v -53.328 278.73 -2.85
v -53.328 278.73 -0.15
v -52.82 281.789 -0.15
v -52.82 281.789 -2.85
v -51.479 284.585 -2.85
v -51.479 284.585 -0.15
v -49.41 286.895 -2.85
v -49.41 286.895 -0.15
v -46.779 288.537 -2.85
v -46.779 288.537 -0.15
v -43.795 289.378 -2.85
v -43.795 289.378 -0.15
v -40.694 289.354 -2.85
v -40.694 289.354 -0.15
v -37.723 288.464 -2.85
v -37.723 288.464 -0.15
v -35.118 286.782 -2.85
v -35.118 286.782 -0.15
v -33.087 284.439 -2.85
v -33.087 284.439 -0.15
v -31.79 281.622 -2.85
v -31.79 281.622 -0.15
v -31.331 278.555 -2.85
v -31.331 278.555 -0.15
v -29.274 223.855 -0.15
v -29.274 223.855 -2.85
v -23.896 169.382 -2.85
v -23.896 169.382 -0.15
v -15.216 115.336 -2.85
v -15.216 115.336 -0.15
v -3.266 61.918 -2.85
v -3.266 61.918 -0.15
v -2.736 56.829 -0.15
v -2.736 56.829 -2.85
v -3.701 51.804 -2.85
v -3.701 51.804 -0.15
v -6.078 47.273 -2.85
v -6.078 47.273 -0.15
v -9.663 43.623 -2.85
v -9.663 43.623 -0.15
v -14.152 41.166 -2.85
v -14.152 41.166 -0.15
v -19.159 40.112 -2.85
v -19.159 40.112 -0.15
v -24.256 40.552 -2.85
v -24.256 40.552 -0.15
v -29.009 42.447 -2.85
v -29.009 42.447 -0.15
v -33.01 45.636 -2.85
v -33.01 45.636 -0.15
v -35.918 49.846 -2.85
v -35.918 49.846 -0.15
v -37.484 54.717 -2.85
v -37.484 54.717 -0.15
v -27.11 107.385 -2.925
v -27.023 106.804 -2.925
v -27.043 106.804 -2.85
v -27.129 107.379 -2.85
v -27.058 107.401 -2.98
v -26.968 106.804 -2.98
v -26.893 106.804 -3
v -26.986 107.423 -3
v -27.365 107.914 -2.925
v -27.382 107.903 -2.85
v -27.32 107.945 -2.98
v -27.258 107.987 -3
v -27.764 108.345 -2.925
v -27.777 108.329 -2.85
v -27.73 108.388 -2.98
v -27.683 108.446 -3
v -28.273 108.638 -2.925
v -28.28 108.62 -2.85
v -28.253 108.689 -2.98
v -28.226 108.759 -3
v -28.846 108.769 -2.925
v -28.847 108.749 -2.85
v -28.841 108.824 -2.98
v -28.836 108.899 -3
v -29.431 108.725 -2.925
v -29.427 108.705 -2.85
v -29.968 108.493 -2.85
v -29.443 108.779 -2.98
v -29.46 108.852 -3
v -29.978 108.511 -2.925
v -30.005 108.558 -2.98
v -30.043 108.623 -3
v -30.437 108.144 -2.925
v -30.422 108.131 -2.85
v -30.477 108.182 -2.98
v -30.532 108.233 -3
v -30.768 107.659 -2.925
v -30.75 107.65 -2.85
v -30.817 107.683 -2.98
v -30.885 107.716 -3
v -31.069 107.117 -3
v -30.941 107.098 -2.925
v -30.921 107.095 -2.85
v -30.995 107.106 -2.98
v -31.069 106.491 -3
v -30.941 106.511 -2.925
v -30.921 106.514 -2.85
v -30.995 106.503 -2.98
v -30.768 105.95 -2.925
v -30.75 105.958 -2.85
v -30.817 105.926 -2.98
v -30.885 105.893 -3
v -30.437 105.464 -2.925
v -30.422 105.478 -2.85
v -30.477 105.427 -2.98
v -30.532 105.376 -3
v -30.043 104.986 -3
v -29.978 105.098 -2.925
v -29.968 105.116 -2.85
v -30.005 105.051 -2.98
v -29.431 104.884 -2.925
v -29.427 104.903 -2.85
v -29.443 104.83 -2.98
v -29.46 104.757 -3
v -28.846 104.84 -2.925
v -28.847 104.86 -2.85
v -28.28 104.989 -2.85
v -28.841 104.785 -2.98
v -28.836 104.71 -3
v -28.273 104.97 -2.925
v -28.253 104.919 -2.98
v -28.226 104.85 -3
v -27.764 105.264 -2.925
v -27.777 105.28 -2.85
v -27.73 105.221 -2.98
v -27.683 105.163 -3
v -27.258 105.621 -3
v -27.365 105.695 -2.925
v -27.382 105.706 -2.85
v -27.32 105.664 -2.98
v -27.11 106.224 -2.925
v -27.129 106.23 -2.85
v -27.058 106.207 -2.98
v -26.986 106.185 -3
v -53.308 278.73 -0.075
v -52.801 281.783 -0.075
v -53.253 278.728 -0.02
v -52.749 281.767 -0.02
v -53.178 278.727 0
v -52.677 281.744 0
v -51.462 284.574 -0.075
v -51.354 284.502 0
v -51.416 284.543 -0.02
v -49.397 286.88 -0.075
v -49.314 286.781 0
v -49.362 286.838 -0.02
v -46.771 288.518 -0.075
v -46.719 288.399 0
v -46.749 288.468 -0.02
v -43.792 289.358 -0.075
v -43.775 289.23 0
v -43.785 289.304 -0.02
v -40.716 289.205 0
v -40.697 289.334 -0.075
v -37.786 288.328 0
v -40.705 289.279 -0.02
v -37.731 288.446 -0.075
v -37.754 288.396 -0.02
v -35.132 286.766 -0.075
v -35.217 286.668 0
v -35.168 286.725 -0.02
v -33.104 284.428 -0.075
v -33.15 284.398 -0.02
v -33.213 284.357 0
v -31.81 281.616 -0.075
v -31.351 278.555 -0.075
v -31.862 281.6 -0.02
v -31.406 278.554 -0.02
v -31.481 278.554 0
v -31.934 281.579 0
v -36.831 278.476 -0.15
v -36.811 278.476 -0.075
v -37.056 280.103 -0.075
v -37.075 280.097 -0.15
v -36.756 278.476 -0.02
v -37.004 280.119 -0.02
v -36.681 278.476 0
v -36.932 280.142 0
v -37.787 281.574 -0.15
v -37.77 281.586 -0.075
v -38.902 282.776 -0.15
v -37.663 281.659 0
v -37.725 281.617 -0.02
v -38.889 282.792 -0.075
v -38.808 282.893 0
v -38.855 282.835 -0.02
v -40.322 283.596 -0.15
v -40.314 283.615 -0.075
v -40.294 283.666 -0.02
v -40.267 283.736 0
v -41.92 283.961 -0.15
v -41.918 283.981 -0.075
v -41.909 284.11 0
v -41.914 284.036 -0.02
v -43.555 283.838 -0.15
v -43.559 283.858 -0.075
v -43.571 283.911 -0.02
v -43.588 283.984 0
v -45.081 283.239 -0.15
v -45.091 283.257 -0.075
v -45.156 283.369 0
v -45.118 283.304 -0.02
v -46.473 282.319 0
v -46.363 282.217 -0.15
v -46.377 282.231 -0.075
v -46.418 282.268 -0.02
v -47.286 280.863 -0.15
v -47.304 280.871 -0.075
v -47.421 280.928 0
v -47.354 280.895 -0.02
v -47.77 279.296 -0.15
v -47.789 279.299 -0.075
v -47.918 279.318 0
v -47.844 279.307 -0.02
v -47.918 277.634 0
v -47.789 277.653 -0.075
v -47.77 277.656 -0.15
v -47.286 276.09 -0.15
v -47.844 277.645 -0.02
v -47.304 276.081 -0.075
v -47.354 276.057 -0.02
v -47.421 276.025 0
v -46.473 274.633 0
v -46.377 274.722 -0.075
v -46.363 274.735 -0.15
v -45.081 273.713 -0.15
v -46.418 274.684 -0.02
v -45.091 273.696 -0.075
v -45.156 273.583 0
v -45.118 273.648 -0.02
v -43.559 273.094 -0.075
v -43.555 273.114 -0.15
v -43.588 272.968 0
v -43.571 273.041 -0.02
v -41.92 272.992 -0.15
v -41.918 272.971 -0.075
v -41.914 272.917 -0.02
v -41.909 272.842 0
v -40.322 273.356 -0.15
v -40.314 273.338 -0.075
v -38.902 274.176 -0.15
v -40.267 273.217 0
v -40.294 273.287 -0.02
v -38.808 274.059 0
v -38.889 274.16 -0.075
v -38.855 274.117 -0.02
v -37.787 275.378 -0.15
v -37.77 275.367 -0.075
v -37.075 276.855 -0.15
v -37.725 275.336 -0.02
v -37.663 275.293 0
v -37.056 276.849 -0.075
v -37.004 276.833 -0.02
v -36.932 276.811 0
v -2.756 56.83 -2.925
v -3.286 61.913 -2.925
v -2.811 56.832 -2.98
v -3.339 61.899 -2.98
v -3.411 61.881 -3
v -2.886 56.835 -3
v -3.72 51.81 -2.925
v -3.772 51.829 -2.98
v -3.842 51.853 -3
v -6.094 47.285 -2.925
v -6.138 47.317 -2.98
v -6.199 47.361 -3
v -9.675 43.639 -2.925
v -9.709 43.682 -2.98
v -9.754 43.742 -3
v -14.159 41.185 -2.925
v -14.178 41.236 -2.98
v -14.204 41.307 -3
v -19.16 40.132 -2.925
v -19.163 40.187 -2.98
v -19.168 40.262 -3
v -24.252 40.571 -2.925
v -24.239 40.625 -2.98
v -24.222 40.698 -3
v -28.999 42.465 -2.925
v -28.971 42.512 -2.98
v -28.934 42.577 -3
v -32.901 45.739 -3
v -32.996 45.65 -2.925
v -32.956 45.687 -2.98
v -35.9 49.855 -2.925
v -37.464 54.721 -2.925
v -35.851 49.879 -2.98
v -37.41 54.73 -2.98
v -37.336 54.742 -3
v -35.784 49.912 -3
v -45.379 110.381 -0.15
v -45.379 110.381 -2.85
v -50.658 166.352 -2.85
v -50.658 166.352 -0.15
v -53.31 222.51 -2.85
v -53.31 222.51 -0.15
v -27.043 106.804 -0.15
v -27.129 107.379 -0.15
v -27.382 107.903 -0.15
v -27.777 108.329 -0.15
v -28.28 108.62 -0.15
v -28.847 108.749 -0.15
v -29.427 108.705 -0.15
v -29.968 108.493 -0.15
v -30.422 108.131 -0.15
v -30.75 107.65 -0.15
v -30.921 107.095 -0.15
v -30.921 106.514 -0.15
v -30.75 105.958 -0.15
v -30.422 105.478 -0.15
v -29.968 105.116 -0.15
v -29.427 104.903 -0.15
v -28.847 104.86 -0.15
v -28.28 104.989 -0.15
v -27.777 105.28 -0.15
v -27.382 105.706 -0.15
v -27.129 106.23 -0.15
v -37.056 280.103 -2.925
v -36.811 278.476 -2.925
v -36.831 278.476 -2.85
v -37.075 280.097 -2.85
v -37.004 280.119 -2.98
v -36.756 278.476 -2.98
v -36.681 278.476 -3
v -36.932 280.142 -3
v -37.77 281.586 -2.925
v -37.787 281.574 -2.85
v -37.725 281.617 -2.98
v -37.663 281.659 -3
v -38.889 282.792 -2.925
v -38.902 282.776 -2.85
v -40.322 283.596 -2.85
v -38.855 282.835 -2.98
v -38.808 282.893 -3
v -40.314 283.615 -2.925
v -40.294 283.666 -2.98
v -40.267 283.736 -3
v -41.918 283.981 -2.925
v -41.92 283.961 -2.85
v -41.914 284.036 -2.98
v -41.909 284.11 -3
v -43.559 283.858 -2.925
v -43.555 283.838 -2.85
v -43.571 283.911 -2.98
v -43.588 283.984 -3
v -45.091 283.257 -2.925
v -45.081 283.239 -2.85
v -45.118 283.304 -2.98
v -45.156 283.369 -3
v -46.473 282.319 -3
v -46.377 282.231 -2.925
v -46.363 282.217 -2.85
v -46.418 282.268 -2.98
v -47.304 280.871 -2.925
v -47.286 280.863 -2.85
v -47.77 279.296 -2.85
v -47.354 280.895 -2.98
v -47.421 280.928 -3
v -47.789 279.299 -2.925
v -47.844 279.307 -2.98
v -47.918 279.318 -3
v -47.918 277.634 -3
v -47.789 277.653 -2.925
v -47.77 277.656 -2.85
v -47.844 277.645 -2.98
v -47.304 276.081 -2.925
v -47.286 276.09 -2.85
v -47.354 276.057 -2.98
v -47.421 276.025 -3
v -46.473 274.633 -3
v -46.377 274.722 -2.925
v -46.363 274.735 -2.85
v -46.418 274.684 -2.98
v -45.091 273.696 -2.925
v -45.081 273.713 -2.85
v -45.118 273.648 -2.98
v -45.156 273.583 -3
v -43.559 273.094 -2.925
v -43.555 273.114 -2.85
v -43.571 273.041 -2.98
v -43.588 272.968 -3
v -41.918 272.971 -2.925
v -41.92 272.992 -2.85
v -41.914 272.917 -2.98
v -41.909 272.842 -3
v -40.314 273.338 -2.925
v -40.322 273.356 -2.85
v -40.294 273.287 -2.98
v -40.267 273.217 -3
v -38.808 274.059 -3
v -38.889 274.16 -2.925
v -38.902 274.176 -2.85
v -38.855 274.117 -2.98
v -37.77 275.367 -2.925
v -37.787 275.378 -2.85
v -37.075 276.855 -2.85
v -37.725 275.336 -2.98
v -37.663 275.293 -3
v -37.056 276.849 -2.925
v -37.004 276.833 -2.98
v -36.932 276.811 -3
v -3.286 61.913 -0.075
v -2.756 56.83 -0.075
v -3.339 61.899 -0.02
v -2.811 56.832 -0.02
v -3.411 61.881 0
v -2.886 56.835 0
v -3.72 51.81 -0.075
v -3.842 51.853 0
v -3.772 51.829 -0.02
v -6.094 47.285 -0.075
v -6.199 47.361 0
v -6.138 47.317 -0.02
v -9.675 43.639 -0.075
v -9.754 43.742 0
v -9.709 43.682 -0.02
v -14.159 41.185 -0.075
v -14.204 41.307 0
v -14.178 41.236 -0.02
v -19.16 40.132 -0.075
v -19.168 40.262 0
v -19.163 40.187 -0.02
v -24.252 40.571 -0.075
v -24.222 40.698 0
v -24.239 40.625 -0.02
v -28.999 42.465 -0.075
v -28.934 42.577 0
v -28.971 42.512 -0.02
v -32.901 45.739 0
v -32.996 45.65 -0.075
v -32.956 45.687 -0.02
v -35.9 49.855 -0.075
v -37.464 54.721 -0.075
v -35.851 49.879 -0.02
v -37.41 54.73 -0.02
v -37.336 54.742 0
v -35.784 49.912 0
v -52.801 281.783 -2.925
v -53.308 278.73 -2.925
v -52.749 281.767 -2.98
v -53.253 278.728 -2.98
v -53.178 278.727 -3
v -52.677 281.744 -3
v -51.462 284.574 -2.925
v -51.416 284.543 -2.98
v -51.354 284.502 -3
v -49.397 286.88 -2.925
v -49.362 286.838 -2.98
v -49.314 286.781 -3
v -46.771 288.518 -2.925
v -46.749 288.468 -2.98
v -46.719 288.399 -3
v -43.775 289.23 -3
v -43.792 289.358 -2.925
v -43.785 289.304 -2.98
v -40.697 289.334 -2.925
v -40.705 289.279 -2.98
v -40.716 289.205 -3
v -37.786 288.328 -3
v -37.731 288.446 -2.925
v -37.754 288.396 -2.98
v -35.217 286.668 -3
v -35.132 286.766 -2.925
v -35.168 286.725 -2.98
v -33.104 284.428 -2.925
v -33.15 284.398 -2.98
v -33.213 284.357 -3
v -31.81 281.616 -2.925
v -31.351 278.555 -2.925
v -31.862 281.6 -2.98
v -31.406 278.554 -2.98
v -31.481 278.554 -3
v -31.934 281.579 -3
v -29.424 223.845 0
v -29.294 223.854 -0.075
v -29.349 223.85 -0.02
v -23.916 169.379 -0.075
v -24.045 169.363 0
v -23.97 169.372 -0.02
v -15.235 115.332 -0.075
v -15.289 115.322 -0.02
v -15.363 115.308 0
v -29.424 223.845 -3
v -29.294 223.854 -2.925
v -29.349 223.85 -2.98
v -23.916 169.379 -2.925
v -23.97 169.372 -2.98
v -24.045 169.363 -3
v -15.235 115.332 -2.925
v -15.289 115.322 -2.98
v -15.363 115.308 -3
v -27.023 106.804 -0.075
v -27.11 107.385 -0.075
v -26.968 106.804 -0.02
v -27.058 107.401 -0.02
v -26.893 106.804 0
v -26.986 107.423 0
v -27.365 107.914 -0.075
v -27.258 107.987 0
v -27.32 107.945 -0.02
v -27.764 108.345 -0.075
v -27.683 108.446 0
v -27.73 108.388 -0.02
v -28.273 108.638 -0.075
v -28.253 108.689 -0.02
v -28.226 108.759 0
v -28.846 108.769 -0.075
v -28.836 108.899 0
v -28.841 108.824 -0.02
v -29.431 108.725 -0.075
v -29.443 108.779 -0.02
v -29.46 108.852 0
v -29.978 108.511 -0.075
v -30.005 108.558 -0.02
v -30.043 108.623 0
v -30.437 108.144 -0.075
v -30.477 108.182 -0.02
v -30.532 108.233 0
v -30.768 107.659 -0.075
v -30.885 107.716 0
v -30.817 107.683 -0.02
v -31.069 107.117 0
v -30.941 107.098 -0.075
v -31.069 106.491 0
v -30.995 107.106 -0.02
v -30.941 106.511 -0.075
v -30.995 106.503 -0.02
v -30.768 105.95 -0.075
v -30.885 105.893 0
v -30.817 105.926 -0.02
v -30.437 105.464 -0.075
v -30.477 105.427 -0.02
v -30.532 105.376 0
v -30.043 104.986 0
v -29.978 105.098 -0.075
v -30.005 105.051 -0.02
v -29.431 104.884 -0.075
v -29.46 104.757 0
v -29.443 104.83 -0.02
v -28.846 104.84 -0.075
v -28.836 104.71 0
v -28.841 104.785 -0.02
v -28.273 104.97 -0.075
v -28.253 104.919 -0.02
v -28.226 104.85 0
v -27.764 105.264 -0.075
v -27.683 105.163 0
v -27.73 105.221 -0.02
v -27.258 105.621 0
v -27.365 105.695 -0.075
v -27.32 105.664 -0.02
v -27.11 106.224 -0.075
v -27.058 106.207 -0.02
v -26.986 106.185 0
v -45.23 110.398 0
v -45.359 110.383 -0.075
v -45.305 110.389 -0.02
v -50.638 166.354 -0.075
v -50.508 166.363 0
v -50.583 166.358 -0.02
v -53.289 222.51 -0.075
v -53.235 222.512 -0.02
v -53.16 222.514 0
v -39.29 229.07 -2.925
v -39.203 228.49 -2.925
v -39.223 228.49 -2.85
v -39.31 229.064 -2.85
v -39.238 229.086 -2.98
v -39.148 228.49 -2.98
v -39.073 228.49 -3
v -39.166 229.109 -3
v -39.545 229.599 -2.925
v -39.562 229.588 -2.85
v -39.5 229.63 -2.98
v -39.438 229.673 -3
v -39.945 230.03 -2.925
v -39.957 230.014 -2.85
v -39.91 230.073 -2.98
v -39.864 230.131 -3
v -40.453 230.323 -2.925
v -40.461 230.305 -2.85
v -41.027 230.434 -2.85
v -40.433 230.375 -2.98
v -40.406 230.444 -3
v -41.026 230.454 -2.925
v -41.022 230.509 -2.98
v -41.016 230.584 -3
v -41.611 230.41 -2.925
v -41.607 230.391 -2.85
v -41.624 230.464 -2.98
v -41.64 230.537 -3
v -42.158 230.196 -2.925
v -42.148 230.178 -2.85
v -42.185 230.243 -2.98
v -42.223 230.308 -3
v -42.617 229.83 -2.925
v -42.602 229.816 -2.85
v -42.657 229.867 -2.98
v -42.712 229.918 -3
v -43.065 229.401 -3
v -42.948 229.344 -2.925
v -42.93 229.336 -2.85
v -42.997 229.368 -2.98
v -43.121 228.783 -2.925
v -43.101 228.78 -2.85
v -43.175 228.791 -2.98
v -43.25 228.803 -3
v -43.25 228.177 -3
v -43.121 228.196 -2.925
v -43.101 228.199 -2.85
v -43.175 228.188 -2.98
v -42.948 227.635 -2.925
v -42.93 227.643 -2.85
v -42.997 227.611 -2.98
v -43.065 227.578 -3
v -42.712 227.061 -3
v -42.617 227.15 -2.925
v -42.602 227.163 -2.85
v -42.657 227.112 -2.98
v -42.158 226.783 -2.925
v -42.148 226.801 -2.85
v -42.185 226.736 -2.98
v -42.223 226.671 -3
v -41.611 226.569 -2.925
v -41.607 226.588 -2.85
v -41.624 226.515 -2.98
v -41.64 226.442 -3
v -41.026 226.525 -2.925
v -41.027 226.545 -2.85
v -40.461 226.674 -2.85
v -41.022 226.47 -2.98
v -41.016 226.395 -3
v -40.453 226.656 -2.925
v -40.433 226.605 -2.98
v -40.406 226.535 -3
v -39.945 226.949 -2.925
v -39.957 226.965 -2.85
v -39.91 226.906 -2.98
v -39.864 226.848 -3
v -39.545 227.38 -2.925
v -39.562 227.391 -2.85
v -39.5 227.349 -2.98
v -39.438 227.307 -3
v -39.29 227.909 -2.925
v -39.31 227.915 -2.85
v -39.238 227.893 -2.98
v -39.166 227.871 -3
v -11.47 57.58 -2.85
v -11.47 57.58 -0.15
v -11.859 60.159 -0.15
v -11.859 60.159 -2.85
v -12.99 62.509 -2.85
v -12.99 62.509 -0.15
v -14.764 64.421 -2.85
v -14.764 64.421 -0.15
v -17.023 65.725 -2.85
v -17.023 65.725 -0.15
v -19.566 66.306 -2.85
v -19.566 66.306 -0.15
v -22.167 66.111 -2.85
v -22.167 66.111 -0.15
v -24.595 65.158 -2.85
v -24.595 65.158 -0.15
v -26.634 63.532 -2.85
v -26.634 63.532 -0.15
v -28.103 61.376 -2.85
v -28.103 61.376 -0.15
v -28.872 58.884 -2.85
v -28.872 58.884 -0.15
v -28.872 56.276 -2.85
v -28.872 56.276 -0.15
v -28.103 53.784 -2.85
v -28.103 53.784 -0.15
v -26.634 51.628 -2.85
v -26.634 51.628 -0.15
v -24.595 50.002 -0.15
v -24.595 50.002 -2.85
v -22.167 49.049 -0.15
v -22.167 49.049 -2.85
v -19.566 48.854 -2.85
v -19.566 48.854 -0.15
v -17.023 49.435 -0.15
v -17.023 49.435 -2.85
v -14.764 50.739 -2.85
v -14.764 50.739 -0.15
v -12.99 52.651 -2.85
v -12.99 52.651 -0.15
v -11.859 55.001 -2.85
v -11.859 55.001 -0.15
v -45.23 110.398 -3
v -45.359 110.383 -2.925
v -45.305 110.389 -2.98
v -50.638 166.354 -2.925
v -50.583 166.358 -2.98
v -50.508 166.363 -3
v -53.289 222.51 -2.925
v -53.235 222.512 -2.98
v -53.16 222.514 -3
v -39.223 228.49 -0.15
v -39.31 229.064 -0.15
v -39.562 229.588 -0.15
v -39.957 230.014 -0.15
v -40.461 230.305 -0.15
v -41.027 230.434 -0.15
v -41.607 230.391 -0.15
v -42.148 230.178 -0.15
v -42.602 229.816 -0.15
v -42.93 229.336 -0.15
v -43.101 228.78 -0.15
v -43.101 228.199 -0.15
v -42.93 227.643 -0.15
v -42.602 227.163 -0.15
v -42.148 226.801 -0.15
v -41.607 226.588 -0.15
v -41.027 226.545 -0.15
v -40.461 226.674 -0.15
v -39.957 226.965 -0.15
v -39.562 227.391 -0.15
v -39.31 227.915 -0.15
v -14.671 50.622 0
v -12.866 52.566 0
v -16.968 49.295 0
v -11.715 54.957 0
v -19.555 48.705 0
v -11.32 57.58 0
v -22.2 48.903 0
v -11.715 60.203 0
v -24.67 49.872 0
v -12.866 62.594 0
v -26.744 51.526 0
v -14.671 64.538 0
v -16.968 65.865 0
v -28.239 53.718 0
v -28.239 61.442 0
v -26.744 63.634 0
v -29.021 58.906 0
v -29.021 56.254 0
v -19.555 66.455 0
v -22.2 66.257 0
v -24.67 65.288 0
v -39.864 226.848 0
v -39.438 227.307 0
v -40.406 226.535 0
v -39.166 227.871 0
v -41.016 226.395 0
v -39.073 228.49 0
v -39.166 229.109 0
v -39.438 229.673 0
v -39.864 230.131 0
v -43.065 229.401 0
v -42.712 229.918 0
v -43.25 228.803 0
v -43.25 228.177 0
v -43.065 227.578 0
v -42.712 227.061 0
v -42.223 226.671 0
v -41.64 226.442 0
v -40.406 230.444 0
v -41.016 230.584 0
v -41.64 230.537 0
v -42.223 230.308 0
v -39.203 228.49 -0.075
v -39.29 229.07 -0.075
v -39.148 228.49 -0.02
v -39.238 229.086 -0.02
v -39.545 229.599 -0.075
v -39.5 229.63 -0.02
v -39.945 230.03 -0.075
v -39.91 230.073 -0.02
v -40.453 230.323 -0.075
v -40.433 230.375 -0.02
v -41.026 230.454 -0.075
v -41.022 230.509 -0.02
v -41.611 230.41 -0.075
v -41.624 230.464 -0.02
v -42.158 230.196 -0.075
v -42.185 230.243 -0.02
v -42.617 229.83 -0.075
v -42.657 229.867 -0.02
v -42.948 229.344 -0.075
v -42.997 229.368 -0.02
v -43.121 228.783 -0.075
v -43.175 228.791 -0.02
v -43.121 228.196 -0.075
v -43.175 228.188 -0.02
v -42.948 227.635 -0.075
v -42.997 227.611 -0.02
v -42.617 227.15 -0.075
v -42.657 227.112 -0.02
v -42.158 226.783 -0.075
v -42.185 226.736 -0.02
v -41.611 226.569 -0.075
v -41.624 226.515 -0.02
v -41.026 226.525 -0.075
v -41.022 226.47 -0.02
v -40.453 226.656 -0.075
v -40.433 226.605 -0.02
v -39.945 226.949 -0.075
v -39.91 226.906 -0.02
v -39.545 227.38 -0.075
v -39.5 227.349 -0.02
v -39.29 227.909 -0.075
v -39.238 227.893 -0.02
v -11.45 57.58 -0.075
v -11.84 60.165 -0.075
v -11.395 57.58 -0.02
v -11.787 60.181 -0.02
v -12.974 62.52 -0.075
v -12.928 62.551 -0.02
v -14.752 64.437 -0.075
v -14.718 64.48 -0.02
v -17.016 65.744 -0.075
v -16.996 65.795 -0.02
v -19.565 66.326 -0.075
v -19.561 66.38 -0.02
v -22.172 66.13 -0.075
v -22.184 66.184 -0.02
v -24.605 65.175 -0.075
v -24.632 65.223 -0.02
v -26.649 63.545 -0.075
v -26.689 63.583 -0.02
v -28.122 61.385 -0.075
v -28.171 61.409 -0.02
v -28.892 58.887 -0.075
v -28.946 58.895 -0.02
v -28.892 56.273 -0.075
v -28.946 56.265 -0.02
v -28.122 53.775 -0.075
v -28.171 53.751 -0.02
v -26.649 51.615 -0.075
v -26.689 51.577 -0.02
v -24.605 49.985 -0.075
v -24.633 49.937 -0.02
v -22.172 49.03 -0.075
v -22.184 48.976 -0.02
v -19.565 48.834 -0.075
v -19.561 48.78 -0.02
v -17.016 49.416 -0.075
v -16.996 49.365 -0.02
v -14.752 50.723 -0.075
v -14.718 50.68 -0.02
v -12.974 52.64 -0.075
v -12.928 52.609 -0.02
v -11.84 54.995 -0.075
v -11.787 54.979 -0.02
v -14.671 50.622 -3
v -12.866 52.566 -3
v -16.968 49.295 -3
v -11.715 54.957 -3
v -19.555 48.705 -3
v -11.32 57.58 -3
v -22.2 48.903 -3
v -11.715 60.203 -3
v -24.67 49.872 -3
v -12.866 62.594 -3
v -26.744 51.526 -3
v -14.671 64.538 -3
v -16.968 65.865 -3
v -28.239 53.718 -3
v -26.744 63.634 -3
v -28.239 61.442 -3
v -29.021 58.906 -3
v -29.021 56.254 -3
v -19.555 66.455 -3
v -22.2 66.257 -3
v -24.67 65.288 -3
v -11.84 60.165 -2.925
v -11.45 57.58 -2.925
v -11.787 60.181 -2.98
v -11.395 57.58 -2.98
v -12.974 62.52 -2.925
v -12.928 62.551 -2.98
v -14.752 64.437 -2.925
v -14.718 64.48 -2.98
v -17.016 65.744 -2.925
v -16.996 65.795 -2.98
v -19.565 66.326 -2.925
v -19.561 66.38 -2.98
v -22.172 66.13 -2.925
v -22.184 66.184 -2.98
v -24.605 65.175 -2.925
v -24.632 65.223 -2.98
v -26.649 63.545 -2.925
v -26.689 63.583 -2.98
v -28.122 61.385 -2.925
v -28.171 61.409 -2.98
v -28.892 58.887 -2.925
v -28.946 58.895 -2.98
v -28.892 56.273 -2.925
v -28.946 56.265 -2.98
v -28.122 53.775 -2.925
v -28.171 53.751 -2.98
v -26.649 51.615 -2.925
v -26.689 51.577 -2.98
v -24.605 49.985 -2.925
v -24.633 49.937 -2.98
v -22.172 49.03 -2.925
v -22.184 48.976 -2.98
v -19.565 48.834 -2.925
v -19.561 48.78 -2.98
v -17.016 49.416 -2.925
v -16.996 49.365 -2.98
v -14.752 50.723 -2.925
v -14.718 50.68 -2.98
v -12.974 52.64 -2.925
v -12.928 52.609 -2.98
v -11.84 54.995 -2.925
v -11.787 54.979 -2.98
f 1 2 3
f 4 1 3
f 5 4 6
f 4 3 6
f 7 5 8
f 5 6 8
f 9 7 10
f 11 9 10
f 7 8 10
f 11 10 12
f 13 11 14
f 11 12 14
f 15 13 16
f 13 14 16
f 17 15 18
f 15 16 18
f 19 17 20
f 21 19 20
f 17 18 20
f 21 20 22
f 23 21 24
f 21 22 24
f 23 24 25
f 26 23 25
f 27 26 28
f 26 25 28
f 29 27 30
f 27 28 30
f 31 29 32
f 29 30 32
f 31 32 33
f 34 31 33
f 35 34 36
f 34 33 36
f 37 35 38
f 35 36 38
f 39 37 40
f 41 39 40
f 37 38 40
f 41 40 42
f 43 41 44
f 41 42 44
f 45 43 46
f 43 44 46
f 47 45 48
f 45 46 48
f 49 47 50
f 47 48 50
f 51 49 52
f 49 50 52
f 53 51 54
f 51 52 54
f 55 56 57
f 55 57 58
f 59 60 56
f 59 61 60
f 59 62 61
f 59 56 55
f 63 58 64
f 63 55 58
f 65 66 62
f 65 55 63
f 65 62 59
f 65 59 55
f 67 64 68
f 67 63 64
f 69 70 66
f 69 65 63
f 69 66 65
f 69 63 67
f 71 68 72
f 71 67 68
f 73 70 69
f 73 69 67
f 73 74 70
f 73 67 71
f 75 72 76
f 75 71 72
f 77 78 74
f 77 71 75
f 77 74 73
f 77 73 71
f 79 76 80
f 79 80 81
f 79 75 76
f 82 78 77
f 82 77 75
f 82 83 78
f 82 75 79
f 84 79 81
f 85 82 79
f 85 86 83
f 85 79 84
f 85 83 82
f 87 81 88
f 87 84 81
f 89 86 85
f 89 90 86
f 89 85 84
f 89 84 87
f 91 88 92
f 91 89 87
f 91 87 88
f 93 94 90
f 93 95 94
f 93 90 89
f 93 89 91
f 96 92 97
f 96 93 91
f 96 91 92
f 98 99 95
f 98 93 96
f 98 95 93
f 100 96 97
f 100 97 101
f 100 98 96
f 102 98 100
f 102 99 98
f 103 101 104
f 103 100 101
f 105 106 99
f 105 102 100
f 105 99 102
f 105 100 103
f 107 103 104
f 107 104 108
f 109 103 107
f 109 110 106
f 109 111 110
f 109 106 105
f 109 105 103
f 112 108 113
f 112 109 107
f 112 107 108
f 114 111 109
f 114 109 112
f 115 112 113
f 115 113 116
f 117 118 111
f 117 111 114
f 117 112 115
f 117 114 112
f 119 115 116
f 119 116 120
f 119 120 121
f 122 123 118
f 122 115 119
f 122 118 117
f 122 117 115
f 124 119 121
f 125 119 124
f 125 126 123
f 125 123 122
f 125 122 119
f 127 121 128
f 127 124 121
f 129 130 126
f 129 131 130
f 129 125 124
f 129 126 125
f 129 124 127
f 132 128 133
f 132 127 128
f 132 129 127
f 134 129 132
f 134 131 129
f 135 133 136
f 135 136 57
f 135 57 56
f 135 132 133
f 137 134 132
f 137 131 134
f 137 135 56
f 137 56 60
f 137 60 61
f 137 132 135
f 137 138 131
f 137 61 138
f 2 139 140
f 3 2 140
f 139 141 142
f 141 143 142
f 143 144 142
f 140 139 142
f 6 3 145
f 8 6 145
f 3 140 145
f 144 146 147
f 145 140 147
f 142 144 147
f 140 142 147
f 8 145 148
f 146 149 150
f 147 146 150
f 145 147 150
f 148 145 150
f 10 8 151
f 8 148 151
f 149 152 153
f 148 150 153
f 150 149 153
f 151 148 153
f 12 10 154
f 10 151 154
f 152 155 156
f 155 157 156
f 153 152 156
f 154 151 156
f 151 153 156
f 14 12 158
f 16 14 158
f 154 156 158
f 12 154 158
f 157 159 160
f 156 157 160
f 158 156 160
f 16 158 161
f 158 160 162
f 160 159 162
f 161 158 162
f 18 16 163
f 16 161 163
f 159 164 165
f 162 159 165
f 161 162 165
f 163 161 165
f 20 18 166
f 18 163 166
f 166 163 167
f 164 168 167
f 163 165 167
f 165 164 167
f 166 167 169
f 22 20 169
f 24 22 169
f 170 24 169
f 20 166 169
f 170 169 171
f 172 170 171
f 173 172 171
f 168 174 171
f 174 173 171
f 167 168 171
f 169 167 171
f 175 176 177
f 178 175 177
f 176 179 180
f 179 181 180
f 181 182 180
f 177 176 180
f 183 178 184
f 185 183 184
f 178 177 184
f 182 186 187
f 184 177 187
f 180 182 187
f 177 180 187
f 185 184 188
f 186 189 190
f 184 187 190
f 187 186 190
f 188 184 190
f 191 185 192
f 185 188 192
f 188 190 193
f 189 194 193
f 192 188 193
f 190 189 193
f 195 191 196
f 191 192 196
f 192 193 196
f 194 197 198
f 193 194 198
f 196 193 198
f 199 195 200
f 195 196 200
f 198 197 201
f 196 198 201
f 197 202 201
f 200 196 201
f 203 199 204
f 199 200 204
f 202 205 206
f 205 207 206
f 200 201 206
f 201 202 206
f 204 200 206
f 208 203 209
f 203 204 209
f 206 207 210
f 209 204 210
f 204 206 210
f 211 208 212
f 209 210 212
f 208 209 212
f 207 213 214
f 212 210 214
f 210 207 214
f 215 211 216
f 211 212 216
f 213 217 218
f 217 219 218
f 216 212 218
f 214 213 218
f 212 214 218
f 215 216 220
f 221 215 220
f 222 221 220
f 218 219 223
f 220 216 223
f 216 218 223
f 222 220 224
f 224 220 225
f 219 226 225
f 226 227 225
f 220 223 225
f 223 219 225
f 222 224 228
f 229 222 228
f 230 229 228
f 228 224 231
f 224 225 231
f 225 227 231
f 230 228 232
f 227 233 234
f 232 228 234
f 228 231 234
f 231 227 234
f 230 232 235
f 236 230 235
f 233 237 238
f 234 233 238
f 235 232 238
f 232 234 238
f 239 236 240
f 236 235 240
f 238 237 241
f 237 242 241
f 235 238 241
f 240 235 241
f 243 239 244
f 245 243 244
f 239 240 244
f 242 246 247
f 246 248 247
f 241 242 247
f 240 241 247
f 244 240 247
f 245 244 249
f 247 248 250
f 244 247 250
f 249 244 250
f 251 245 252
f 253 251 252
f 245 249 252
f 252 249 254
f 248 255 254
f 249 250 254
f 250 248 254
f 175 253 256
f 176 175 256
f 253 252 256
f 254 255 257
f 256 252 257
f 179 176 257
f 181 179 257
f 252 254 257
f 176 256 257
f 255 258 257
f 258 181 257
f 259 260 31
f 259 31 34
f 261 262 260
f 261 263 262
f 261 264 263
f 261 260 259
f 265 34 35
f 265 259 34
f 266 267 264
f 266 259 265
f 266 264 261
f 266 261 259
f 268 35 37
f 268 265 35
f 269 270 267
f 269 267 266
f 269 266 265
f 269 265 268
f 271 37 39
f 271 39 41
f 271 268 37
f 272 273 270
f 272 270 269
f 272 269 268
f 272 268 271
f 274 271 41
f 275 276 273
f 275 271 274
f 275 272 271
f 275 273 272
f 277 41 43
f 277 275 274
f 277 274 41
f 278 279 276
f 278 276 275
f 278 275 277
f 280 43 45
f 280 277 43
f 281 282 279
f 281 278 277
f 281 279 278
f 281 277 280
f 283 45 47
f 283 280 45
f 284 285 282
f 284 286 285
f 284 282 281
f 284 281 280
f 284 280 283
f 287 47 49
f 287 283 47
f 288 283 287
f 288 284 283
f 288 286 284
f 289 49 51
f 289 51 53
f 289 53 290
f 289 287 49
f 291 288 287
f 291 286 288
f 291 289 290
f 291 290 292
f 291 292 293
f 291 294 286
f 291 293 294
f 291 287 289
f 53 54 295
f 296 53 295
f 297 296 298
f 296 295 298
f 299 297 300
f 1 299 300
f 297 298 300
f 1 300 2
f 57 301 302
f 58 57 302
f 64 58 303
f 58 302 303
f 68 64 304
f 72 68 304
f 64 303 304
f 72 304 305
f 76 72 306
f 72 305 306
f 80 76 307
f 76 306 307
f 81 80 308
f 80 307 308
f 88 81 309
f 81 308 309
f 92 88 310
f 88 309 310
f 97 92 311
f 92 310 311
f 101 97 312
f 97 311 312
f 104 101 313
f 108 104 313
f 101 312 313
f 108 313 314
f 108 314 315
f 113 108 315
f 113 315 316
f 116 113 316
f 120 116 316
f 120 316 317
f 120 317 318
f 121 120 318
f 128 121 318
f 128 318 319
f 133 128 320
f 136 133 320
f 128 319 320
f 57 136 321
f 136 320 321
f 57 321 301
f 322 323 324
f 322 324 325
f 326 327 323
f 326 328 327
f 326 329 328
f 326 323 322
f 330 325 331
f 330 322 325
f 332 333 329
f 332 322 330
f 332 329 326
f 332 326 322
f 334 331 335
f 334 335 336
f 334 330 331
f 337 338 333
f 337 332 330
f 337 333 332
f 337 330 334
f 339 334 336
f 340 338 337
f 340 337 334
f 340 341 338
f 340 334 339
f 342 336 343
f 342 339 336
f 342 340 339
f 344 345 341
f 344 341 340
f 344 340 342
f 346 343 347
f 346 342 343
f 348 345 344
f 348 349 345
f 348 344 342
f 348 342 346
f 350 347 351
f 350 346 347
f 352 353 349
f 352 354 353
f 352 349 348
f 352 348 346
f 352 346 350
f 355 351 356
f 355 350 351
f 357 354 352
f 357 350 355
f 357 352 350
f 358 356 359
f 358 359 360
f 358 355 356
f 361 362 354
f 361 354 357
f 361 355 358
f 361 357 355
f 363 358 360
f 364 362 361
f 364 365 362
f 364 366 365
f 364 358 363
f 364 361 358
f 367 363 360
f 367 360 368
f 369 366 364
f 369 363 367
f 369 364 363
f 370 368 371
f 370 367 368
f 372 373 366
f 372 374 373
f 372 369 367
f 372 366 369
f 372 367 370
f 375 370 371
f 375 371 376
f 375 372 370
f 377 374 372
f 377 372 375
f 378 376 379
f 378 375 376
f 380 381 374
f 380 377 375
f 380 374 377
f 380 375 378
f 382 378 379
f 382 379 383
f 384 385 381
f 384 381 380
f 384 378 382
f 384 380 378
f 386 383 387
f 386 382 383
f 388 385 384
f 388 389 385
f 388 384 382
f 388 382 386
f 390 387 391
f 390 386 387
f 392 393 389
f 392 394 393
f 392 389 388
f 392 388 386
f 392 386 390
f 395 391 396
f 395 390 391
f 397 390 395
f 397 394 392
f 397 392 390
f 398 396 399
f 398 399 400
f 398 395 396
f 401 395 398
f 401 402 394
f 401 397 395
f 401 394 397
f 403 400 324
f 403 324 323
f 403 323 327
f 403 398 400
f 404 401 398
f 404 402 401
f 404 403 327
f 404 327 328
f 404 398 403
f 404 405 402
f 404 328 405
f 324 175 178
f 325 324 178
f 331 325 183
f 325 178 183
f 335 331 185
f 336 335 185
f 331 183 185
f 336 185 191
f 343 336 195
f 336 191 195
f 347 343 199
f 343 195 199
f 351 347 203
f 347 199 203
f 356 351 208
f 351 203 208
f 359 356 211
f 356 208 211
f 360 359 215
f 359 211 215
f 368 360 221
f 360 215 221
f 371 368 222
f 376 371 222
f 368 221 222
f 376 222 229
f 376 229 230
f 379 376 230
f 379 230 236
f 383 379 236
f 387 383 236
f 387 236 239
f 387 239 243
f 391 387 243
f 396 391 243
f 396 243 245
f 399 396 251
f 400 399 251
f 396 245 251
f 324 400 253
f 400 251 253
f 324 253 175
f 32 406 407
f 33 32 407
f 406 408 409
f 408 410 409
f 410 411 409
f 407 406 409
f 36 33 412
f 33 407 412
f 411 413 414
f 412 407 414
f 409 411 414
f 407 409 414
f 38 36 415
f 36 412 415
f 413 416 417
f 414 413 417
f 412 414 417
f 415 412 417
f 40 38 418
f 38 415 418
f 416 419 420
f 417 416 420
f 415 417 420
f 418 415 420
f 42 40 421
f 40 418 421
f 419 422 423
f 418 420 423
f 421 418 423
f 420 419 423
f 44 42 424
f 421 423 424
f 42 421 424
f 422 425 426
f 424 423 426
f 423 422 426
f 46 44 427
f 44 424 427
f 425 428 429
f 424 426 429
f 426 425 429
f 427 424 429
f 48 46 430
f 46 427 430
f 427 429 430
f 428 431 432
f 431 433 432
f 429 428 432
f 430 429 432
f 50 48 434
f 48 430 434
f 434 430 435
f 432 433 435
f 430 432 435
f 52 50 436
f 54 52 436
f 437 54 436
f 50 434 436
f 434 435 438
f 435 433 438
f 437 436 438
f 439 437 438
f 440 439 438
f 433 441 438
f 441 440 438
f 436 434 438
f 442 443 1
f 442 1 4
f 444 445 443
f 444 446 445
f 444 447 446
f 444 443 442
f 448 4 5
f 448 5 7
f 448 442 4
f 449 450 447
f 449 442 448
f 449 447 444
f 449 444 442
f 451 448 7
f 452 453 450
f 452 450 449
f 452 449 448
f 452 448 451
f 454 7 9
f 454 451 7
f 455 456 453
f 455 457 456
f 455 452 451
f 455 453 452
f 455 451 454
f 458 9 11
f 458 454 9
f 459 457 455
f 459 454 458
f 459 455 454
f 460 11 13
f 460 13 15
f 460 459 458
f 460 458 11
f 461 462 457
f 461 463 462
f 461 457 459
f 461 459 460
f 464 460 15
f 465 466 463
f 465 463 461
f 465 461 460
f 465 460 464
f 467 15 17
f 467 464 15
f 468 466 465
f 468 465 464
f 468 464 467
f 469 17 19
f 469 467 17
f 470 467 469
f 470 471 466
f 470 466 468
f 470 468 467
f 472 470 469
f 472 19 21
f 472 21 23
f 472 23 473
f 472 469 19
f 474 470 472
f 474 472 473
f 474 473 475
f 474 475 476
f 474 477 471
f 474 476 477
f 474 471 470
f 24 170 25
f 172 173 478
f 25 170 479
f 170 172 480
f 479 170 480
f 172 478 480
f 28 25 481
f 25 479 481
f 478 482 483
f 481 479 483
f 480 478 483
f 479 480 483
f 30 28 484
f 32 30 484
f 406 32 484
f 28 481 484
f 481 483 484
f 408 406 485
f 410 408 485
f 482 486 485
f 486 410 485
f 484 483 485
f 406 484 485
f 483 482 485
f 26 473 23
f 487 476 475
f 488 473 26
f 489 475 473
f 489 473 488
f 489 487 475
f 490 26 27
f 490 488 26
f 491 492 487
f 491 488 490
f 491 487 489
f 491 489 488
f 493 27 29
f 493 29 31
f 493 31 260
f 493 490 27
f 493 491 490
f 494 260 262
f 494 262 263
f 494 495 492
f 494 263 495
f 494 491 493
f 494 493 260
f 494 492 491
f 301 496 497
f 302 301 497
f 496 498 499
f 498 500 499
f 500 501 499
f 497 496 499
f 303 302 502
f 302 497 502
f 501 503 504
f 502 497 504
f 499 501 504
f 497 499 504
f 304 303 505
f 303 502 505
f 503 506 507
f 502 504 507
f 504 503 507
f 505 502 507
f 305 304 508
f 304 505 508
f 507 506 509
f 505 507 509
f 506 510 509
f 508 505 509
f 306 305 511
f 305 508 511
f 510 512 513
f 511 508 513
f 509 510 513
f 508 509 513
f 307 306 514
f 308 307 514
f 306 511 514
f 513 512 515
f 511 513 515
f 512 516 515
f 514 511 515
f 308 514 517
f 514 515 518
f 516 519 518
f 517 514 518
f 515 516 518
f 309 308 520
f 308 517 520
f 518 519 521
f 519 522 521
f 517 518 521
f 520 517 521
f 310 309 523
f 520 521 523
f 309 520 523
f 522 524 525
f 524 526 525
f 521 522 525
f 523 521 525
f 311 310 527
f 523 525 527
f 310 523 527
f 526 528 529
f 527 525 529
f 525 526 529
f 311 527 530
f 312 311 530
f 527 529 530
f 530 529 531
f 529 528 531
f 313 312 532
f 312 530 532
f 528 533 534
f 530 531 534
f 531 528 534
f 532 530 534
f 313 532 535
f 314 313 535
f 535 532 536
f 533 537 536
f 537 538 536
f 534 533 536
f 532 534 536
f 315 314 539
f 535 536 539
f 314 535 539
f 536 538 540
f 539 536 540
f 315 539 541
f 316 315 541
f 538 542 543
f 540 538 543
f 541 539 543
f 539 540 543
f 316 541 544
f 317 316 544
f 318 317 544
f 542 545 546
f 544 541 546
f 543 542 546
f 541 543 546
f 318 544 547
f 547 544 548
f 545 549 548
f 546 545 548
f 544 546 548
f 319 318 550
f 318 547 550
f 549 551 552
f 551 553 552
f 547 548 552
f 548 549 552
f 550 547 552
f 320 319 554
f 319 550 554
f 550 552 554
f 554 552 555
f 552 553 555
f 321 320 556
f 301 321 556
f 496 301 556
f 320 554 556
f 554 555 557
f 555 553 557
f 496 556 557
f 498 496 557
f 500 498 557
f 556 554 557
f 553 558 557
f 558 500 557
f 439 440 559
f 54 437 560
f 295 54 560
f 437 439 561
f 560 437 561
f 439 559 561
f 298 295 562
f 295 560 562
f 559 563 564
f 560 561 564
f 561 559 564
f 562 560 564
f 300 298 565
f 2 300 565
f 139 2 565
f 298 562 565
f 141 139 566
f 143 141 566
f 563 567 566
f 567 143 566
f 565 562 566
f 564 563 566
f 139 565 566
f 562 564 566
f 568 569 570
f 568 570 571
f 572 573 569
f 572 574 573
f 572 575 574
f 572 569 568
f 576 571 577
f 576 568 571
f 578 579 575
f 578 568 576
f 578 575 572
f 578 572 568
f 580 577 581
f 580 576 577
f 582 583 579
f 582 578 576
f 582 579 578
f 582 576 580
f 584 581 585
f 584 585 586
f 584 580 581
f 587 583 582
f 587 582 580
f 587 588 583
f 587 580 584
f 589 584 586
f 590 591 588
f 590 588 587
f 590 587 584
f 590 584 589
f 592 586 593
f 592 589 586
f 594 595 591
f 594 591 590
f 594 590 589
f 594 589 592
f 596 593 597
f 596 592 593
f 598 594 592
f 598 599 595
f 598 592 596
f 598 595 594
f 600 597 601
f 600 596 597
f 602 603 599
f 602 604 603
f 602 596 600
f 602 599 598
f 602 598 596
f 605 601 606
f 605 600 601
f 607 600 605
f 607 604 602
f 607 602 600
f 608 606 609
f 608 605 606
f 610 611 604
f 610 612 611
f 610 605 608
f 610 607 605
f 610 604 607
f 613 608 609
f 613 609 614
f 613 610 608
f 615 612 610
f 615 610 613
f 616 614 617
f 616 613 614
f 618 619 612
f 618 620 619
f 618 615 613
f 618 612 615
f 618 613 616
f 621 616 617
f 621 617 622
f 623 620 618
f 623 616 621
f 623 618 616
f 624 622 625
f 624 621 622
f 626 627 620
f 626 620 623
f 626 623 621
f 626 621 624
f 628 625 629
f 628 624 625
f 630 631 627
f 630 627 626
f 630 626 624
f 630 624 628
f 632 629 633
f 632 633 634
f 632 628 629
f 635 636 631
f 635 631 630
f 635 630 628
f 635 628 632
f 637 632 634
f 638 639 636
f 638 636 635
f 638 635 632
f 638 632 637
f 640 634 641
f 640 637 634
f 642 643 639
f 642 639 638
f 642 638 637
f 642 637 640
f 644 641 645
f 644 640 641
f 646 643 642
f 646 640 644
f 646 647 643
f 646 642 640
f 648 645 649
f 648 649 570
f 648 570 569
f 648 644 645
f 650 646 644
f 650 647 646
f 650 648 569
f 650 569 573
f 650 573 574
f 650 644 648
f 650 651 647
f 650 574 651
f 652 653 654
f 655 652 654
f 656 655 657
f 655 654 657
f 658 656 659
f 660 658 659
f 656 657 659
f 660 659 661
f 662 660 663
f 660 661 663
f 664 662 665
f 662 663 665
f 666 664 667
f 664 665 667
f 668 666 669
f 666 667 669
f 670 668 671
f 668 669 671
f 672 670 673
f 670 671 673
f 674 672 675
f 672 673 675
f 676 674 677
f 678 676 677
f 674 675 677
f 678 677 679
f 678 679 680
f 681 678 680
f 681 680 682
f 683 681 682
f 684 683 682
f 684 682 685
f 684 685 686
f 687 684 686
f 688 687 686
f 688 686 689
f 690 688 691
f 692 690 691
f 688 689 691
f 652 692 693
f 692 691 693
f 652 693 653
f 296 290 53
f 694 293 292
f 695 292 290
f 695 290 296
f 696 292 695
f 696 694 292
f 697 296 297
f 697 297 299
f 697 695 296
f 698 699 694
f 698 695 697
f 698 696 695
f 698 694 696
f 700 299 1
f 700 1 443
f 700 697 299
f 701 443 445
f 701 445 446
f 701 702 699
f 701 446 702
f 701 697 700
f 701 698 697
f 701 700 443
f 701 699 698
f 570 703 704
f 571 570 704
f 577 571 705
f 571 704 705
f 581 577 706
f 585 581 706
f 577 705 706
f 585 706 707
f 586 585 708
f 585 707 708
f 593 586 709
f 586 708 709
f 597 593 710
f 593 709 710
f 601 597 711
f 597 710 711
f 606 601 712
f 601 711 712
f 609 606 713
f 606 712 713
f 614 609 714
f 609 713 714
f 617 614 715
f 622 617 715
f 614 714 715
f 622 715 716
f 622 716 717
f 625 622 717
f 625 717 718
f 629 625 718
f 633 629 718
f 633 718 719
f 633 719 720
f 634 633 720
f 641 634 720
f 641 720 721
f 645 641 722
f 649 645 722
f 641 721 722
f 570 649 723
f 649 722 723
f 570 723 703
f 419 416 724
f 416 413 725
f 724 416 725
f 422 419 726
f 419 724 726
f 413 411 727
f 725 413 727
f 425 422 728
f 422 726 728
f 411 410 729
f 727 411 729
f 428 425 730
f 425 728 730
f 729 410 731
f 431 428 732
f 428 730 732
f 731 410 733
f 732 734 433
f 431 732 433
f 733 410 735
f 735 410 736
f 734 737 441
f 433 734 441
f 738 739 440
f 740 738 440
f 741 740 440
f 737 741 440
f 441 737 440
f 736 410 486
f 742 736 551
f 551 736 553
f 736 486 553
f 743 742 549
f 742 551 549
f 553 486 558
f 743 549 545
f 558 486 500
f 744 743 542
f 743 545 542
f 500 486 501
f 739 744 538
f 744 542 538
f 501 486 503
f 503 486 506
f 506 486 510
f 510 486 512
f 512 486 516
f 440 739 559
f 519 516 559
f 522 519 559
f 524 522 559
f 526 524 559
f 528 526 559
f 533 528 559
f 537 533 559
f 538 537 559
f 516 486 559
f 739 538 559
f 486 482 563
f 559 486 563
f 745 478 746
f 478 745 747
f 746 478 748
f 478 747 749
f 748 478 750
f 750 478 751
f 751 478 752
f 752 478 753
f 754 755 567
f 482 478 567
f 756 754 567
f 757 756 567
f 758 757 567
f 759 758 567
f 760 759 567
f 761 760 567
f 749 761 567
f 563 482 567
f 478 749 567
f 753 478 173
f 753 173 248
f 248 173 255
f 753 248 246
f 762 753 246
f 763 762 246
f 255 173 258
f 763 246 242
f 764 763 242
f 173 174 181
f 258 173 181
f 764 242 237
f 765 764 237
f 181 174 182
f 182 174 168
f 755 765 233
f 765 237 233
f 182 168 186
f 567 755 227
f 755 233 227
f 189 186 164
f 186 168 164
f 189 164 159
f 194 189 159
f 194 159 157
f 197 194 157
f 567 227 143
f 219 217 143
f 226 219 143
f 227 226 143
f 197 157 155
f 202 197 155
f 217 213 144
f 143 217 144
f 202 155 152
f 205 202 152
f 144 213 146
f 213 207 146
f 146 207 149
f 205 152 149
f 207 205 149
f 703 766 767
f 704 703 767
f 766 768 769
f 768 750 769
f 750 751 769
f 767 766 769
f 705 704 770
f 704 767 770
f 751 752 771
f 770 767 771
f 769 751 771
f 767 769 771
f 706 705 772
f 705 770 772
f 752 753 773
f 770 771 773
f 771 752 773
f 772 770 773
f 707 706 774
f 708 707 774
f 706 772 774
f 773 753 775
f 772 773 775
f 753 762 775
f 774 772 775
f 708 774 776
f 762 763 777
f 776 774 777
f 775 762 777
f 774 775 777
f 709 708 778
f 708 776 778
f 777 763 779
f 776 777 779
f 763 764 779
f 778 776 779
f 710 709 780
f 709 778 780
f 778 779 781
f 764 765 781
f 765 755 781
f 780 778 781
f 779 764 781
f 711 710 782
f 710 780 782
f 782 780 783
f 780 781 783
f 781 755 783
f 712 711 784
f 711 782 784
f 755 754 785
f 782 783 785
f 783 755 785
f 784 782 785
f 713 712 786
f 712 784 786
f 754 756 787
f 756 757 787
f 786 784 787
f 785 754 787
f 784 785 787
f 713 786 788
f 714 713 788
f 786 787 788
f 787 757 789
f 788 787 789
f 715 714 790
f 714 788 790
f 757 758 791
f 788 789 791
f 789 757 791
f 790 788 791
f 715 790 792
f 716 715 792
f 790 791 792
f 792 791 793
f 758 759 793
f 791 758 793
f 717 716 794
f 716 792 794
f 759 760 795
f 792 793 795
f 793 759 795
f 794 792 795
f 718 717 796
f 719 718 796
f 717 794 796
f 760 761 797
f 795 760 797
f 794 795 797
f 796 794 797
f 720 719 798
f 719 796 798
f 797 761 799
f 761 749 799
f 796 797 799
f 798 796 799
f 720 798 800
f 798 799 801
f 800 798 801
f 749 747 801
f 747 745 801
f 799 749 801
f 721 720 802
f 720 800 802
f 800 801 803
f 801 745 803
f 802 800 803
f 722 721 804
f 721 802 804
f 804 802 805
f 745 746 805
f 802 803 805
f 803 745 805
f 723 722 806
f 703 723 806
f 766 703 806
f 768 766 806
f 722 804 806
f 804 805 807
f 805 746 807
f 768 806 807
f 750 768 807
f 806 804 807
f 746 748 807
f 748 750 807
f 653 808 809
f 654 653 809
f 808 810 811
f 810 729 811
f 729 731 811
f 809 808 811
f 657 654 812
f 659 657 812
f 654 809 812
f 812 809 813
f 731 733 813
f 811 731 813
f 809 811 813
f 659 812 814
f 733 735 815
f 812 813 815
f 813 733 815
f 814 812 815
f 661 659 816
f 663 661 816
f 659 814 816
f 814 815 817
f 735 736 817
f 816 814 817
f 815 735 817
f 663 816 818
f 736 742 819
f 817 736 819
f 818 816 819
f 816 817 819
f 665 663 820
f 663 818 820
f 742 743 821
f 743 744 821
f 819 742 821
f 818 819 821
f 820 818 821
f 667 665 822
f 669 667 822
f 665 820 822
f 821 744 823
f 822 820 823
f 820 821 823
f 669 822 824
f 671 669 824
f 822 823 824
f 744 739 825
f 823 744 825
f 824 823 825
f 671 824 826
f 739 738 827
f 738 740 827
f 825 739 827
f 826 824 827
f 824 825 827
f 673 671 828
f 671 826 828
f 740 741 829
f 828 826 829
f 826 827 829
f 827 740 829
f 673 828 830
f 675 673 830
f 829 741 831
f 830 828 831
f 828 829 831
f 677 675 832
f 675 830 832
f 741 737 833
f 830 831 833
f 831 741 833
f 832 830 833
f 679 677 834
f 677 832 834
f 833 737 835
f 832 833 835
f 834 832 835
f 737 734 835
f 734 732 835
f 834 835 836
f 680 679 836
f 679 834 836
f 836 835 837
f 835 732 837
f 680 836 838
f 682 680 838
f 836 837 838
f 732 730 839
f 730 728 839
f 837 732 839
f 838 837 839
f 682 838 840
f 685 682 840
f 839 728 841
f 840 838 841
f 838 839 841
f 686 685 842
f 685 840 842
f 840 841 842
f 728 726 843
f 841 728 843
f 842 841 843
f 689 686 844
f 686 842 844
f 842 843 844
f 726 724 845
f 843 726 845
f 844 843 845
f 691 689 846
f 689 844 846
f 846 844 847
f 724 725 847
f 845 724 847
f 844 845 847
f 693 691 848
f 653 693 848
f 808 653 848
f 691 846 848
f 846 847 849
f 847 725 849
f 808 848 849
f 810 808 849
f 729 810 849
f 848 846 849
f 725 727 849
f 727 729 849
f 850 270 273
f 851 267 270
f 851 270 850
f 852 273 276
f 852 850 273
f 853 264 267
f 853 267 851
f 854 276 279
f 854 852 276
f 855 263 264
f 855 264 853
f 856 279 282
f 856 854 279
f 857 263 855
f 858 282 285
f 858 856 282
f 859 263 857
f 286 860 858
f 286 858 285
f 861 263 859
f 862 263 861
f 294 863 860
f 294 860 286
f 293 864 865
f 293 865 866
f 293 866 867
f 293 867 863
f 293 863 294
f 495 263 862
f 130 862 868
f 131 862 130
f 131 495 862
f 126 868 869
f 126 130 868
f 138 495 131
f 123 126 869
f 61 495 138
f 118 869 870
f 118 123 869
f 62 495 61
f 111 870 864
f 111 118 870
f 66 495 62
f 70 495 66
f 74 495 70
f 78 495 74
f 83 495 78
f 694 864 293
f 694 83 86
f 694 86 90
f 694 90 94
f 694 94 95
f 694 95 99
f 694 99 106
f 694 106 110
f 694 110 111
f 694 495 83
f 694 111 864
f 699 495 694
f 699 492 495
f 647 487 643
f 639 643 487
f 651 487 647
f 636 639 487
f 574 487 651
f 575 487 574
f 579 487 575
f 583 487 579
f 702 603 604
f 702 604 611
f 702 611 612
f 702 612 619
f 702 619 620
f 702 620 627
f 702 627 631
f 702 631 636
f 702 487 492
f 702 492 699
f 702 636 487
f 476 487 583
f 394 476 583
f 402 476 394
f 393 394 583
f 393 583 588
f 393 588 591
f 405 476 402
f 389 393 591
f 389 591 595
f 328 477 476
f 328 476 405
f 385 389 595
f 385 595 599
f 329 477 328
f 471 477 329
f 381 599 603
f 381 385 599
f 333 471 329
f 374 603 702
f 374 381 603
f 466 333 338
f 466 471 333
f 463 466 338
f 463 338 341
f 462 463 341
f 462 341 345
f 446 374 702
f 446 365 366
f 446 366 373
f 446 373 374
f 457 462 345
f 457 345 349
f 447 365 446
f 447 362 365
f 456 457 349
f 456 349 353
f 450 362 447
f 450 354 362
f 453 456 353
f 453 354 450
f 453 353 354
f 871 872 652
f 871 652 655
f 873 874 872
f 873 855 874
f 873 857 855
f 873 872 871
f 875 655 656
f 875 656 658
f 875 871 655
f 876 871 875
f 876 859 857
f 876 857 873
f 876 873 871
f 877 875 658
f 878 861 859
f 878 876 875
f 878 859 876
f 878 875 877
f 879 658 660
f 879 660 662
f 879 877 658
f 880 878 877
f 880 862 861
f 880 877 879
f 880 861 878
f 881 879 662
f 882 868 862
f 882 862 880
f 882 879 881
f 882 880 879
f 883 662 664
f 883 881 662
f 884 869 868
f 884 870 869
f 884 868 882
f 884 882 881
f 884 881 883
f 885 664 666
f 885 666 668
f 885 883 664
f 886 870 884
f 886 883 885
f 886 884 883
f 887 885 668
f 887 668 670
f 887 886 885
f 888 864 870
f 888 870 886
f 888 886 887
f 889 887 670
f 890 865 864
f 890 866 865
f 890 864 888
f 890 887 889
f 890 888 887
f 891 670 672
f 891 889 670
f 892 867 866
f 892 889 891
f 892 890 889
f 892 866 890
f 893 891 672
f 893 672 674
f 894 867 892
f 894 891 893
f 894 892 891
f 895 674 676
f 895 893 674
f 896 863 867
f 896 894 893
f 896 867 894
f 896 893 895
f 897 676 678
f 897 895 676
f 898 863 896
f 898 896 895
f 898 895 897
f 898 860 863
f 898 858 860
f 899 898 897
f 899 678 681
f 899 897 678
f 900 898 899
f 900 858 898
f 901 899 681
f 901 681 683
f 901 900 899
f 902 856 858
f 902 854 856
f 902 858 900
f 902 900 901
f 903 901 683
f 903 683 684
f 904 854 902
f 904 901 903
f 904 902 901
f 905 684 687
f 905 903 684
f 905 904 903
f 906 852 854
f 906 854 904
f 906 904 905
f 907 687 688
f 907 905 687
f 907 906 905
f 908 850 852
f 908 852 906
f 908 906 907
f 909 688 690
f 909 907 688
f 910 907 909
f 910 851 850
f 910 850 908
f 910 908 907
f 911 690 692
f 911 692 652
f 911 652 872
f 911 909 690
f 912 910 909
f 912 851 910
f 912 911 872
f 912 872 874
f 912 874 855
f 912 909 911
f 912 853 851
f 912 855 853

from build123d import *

# Parameters (mm, degrees)
SKETCH1_R           = 8.75
SKETCH1_R_2         = 5.5
SKETCH1_R_3         = 1.95
BOSS_EXTRUDE1_DEPTH = 3
FILLET1_R           = 0.15


with BuildPart() as part:
    # Sketch1 → Boss-Extrude1 (new body)
    with BuildSketch(Plane.XY):
        with BuildLine():
            ThreePointArc((-31.33121526, 278.555031013), (-23.895823386, 169.381810272), (-3.26615944, 61.917890072))
            ThreePointArc((-3.26615944, 61.917890072), (-16.616387727, 40.455048071), (-37.484276985, 54.717354337))
            ThreePointArc((-37.484276985, 54.717354337), (-50.657983368, 166.352339982), (-53.327997744, 278.730218512))
            ThreePointArc((-53.327997744, 278.730218512), (-42.243328606, 289.475795689), (-31.33121526, 278.555031013))
        make_face()
        with Locations((-20.22, 57.58)):
            Circle(SKETCH1_R, mode=Mode.SUBTRACT)
        with Locations((-42.33093239, 278.476144531)):
            Circle(SKETCH1_R_2, mode=Mode.SUBTRACT)
        with Locations((-41.172996234, 228.489554491)):
            Circle(SKETCH1_R_3, mode=Mode.SUBTRACT)
        with Locations((-28.99273489, 106.804375289)):
            Circle(SKETCH1_R_3, mode=Mode.SUBTRACT)
    extrude(amount=-BOSS_EXTRUDE1_DEPTH)

    # Fillet1
    fillet1_edges = [part.edges().sort_by_distance(p)[0] for p in [
        (-28.97, 57.58, -3),
        (-28.97, 57.58, 0),
        (-16.616387727, 40.455048071, -3),
        (-47.83093239, 278.476144531, -3),
        (-47.83093239, 278.476144531, 0),
        (-23.895823386, 169.381810272, -3),
        (-30.94273489, 106.804375289, -3),
        (-30.94273489, 106.804375289, 0),
        (-43.122996234, 228.489554491, -3),
        (-43.122996234, 228.489554491, 0),
        (-42.243328606, 289.475795689, -3),
        (-23.895823386, 169.381810272, 0),
        (-16.616387727, 40.455048071, 0),
        (-50.657983368, 166.352339982, 0),
        (-42.243328606, 289.475795689, 0),
        (-50.657983368, 166.352339982, -3),
    ]]
    fillet(fillet1_edges, radius=FILLET1_R)


solid = part.part
